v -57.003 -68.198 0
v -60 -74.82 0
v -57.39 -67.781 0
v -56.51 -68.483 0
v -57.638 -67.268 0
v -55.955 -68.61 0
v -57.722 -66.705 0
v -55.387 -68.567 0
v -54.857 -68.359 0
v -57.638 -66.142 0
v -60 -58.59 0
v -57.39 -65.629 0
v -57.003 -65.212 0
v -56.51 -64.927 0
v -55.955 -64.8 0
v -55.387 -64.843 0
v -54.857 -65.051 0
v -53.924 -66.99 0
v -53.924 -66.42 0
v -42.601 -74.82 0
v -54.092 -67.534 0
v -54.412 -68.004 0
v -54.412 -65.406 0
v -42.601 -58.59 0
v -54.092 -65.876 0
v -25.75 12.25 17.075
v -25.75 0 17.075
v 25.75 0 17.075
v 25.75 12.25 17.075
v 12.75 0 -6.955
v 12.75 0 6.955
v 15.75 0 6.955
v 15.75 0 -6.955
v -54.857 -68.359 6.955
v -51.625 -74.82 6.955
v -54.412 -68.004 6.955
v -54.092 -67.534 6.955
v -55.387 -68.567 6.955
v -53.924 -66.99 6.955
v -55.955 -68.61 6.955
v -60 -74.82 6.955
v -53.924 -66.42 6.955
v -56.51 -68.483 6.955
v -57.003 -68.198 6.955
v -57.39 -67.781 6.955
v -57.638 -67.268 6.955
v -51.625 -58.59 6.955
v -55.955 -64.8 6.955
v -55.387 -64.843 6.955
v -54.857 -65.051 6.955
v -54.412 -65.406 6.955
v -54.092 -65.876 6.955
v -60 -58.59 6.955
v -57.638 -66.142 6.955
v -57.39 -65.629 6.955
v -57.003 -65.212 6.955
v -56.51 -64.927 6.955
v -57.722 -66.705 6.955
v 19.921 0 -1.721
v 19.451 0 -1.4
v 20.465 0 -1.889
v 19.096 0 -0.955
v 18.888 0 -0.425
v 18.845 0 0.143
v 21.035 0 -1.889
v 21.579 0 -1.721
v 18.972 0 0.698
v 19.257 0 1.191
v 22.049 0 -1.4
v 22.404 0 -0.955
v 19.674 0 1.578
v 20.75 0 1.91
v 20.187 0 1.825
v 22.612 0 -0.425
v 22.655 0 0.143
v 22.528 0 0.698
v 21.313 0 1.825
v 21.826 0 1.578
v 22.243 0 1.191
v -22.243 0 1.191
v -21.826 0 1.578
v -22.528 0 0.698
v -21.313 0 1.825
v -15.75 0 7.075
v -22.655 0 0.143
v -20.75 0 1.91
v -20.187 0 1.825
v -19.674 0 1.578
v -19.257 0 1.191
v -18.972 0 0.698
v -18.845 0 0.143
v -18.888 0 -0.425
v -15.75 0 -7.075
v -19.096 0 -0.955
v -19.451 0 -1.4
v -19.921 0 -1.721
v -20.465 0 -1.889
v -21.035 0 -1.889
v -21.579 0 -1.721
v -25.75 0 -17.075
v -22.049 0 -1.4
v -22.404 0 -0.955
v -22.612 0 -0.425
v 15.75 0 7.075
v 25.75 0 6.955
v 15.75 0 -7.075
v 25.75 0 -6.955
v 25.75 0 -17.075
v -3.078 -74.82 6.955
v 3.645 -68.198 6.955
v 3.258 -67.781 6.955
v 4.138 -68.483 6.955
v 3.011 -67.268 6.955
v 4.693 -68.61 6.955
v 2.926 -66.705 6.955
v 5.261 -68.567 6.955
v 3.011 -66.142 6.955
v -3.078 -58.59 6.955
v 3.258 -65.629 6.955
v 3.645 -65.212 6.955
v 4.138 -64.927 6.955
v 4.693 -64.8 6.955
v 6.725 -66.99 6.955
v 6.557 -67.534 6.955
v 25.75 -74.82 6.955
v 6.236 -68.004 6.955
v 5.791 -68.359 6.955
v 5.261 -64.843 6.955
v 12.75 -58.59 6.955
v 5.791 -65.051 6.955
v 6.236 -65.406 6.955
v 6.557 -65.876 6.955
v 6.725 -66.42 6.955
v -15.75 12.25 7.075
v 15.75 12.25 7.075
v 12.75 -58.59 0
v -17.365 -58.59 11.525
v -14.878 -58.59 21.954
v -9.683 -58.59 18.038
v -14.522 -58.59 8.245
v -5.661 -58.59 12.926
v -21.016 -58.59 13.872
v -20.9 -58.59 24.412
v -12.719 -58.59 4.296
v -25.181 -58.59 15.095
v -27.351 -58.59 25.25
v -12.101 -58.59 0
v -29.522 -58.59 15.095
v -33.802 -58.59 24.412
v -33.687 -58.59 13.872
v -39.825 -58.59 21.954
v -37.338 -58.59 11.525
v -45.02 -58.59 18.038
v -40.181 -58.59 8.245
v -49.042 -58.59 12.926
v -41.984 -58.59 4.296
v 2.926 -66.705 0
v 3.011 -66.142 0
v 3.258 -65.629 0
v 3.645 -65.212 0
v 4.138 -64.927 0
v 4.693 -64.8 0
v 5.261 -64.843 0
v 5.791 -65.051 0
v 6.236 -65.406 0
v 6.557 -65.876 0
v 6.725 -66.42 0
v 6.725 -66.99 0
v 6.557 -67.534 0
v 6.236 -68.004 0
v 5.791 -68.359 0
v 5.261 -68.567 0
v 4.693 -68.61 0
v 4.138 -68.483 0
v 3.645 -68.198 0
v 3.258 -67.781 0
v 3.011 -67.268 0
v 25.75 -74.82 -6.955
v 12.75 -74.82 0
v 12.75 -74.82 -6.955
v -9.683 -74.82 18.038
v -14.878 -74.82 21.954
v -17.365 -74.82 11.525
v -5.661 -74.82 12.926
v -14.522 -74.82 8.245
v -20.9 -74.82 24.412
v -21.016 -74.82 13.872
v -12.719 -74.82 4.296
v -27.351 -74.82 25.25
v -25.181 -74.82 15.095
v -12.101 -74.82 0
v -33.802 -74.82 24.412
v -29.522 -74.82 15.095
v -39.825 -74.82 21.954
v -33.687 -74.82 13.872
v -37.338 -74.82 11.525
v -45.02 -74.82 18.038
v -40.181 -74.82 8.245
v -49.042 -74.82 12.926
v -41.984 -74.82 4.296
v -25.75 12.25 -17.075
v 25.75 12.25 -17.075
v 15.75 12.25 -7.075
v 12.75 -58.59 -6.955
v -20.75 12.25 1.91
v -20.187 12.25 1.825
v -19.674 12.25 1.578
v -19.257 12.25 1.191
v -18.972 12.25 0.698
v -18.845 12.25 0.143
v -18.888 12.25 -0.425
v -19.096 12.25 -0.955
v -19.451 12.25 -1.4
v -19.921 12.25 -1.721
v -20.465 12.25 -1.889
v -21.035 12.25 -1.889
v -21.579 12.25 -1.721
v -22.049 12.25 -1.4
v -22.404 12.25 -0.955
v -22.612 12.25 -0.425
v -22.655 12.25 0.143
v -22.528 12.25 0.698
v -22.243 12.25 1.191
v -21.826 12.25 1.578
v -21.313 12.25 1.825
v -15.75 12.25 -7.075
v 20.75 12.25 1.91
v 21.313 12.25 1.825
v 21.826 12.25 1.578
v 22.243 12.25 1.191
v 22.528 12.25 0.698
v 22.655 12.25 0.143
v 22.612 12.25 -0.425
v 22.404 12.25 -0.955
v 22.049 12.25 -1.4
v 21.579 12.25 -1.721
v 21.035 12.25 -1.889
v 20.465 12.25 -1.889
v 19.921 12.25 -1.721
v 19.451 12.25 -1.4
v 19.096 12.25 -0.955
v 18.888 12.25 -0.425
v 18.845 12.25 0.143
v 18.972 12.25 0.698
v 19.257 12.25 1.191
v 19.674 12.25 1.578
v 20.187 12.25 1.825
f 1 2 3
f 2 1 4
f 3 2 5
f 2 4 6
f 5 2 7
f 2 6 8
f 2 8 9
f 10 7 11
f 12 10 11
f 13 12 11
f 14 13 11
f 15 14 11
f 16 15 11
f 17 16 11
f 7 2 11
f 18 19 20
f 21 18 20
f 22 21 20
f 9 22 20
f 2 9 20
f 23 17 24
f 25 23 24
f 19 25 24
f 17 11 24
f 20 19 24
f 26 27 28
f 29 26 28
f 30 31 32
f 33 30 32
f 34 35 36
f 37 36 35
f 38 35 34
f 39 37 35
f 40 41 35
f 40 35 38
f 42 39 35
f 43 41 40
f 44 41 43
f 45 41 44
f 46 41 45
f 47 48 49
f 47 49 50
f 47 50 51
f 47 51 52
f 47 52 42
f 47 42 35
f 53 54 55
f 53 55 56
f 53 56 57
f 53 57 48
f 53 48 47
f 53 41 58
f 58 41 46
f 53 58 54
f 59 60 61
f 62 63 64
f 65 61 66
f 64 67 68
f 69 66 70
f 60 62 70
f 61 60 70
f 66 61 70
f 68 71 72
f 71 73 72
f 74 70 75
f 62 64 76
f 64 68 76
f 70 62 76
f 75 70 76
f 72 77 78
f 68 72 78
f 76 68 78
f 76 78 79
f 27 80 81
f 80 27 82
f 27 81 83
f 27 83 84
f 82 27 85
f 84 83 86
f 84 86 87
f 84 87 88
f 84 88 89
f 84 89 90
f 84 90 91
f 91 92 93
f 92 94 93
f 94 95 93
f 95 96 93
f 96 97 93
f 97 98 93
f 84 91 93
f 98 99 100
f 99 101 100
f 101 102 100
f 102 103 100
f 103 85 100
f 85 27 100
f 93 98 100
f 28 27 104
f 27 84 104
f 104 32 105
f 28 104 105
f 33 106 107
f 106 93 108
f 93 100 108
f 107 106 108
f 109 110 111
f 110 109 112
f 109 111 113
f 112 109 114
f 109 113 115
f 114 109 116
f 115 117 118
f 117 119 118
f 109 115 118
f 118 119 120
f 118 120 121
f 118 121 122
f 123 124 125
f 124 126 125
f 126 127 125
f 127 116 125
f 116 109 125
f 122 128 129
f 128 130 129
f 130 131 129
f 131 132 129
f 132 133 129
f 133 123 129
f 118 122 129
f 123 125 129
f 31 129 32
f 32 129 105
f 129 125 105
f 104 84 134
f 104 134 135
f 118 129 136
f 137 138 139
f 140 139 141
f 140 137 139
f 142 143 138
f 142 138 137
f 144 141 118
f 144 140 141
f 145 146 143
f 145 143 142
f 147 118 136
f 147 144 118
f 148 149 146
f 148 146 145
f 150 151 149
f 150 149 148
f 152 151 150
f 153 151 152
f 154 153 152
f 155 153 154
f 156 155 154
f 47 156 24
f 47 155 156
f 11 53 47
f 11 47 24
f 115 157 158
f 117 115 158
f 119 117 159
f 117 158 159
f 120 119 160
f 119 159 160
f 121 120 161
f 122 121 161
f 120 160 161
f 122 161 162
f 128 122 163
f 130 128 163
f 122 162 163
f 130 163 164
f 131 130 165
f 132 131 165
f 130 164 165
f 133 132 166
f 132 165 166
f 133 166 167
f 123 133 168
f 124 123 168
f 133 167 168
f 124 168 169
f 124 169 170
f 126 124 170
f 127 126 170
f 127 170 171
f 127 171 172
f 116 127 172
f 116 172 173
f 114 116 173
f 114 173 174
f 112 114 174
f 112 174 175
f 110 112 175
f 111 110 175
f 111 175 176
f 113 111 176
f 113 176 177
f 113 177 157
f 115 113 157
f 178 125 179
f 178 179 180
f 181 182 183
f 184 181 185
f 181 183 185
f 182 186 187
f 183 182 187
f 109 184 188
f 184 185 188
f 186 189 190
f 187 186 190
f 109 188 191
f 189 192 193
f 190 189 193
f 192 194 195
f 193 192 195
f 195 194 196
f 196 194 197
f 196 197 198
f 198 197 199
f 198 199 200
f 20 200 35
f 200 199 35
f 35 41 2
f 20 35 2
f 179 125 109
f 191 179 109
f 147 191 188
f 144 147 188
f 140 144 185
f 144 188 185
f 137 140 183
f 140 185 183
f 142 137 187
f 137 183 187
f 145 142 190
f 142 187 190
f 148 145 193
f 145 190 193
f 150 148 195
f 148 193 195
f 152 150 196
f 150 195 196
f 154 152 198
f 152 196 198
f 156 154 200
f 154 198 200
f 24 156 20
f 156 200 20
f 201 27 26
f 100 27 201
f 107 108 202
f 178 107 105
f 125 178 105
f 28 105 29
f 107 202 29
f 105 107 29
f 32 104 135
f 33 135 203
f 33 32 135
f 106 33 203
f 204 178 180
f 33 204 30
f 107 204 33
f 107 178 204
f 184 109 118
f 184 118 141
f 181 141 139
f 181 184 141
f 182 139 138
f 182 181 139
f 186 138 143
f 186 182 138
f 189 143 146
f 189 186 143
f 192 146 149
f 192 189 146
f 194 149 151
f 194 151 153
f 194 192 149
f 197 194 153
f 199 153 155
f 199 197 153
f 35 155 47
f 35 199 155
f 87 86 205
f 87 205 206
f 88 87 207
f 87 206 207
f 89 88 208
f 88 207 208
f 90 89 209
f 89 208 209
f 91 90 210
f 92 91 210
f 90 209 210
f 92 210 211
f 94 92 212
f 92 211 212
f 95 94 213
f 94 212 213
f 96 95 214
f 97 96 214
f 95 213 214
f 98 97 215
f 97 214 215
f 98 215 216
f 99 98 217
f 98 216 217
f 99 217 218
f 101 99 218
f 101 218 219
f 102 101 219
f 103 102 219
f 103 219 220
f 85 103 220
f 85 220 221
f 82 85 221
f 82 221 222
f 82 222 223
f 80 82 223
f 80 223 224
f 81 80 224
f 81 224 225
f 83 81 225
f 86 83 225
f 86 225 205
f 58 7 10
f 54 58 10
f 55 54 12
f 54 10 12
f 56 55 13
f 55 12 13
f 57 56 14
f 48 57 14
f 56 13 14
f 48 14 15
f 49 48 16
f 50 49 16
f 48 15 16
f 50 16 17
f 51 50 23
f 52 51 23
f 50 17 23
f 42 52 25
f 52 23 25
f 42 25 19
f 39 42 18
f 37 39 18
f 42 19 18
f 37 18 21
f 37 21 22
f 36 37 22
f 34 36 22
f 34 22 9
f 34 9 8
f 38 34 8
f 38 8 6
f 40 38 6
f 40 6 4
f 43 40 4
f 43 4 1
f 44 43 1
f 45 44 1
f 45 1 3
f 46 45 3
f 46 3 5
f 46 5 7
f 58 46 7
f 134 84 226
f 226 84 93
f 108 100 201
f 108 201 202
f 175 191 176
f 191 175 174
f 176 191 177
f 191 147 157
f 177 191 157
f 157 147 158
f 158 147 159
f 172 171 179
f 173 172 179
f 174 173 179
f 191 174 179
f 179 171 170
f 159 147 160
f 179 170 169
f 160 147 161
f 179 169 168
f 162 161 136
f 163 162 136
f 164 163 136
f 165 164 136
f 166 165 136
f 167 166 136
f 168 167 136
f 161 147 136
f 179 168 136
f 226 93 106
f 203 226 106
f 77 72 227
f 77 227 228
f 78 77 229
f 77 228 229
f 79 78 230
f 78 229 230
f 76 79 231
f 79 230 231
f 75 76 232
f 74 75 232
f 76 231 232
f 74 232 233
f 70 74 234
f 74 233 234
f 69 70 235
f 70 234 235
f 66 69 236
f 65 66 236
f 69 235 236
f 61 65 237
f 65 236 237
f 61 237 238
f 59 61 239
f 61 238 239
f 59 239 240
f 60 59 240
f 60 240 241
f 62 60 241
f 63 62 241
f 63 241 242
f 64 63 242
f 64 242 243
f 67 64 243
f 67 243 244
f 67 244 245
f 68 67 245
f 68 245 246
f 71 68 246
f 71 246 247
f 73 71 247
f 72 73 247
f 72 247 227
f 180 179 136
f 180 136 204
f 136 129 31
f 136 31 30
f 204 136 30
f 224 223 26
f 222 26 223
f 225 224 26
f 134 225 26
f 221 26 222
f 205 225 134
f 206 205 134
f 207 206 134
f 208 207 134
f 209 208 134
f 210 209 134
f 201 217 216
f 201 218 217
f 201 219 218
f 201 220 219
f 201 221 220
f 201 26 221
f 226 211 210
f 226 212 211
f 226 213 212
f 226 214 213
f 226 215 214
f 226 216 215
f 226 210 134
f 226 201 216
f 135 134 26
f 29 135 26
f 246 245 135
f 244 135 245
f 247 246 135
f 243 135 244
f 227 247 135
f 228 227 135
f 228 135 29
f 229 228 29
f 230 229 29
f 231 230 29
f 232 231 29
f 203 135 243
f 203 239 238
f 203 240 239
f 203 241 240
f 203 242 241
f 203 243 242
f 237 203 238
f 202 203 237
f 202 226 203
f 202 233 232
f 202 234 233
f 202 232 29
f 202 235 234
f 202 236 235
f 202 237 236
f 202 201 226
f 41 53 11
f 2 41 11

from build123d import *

# Parameters (mm, degrees)
SKETCH_1_W           = 51.5
SKETCH_1_H           = 34.15
SKETCH_1_W_2         = 31.5
SKETCH_1_H_2         = 14.15
EXTRUDE_1_DEPTH      = 12.25
SKETCH_2_R           = 1.91
CUT_EXTRUDE_1_DEPTH  = 34.236736076
SKETCH_4_W           = 13
SKETCH_4_H           = 13.91
EXTRUDE_1_2_DEPTH    = 74.82
SKETCH_5_W           = 13.91
SKETCH_5_H           = 16.23
EXTRUDE_2_DEPTH      = 16
SKETCH_7_R           = 25.25
SKETCH_7_R_2         = 15.25
EXTRUDE_2_2_DEPTH    = 16.23
SKETCH_15_R          = 1.91
CUT_EXTRUDE_6_DEPTH  = 97.964478439
SKETCH_16_W          = 13.91
SKETCH_16_H          = 16.23
EXTRUDE_4_DEPTH      = 10
SKETCH_17_R          = 1.91
CUT_EXTRUDE_7_DEPTH  = 102.16913771
SKETCH_23_W          = 89.330713517
SKETCH_23_H          = 36.104783584
CUT_EXTRUDE_12_DEPTH = 57


with BuildPart() as part:
    # 草圖1 → Extrude 1 (new body)
    with BuildSketch(Plane(origin=(0, 0, 0), x_dir=(1, 0, 0), z_dir=(0, 1, 0))):
        Rectangle(SKETCH_1_W, SKETCH_1_H)
        Rectangle(SKETCH_1_W_2, SKETCH_1_H_2, mode=Mode.SUBTRACT)
    extrude(amount=EXTRUDE_1_DEPTH)

    # 草圖2 → 除料-伸長1 (cut, through all)
    with BuildSketch(Plane(origin=(0, 12.25, 0), x_dir=(1, 0, 0), z_dir=(0, 1, 0))):
        with Locations(Location((-20.75, 0, 0), (0, 0, 270))):
            Circle(SKETCH_2_R)
        with Locations(Location((20.75, 0, 0), (0, 0, 270))):
            Circle(SKETCH_2_R)
    extrude(amount=-CUT_EXTRUDE_1_DEPTH, mode=Mode.SUBTRACT)

    # 草圖4 → Extrude 1 2 (add)
    with BuildSketch(Plane.XZ):
        with Locations((19.25, 0)):
            Rectangle(SKETCH_4_W, SKETCH_4_H)
    extrude(amount=EXTRUDE_1_2_DEPTH)

    # 草圖5 → Extrude 2 (add)
    with BuildSketch(Plane.ZY.offset(-12.75)):
        with Locations((0, -66.705)):
            Rectangle(SKETCH_5_W, SKETCH_5_H)
    extrude(amount=EXTRUDE_2_DEPTH)

    # 草圖7 → Extrude 2 2 (add)
    with BuildSketch(Plane(origin=(3.626674765, -74.82, 0), x_dir=(1, 0, 0), z_dir=(0, -1, 0))):
        with Locations((-30.978154344, 0)):
            Circle(SKETCH_7_R)
        with Locations((-30.978154344, 0)):
            Circle(SKETCH_7_R_2, mode=Mode.SUBTRACT)
    extrude(amount=-EXTRUDE_2_2_DEPTH)

    # 草圖15 → 除料-伸長6 (cut, through all)
    with BuildSketch(Plane(origin=(0, 0, -6.955), x_dir=(-1, 0, 0), z_dir=(0, 0, -1))):
        with Locations((-4.835883248, -66.705)):
            Circle(SKETCH_15_R)
    extrude(amount=-CUT_EXTRUDE_6_DEPTH, mode=Mode.SUBTRACT)

    # 草圖16 → 填料-伸長4 (add)
    with BuildSketch(Plane(origin=(-60, 0, 0), x_dir=(0, 0, -1), z_dir=(1, 0, 0))):
        with Locations((0, -66.705)):
            Rectangle(SKETCH_16_W, SKETCH_16_H)
    extrude(amount=EXTRUDE_4_DEPTH)

    # 草圖17 → 除料-伸長7 (cut, through all)
    with BuildSketch(Plane(origin=(0, 0, -6.955), x_dir=(-1, 0, 0), z_dir=(0, 0, -1))):
        with Locations((55.812362827, -66.705)):
            Circle(SKETCH_17_R)
    extrude(amount=-CUT_EXTRUDE_7_DEPTH, mode=Mode.SUBTRACT)

    # 草圖23 → 除料-伸長12 (cut)
    with BuildSketch(Plane(origin=(0, -58.59, 0), x_dir=(1, 0, 0), z_dir=(0, 1, 0))):
        with Locations((-31.915356759, 18.052391792)):
            Rectangle(SKETCH_23_W, SKETCH_23_H)
    extrude(amount=-CUT_EXTRUDE_12_DEPTH, mode=Mode.SUBTRACT)


solid = part.part
